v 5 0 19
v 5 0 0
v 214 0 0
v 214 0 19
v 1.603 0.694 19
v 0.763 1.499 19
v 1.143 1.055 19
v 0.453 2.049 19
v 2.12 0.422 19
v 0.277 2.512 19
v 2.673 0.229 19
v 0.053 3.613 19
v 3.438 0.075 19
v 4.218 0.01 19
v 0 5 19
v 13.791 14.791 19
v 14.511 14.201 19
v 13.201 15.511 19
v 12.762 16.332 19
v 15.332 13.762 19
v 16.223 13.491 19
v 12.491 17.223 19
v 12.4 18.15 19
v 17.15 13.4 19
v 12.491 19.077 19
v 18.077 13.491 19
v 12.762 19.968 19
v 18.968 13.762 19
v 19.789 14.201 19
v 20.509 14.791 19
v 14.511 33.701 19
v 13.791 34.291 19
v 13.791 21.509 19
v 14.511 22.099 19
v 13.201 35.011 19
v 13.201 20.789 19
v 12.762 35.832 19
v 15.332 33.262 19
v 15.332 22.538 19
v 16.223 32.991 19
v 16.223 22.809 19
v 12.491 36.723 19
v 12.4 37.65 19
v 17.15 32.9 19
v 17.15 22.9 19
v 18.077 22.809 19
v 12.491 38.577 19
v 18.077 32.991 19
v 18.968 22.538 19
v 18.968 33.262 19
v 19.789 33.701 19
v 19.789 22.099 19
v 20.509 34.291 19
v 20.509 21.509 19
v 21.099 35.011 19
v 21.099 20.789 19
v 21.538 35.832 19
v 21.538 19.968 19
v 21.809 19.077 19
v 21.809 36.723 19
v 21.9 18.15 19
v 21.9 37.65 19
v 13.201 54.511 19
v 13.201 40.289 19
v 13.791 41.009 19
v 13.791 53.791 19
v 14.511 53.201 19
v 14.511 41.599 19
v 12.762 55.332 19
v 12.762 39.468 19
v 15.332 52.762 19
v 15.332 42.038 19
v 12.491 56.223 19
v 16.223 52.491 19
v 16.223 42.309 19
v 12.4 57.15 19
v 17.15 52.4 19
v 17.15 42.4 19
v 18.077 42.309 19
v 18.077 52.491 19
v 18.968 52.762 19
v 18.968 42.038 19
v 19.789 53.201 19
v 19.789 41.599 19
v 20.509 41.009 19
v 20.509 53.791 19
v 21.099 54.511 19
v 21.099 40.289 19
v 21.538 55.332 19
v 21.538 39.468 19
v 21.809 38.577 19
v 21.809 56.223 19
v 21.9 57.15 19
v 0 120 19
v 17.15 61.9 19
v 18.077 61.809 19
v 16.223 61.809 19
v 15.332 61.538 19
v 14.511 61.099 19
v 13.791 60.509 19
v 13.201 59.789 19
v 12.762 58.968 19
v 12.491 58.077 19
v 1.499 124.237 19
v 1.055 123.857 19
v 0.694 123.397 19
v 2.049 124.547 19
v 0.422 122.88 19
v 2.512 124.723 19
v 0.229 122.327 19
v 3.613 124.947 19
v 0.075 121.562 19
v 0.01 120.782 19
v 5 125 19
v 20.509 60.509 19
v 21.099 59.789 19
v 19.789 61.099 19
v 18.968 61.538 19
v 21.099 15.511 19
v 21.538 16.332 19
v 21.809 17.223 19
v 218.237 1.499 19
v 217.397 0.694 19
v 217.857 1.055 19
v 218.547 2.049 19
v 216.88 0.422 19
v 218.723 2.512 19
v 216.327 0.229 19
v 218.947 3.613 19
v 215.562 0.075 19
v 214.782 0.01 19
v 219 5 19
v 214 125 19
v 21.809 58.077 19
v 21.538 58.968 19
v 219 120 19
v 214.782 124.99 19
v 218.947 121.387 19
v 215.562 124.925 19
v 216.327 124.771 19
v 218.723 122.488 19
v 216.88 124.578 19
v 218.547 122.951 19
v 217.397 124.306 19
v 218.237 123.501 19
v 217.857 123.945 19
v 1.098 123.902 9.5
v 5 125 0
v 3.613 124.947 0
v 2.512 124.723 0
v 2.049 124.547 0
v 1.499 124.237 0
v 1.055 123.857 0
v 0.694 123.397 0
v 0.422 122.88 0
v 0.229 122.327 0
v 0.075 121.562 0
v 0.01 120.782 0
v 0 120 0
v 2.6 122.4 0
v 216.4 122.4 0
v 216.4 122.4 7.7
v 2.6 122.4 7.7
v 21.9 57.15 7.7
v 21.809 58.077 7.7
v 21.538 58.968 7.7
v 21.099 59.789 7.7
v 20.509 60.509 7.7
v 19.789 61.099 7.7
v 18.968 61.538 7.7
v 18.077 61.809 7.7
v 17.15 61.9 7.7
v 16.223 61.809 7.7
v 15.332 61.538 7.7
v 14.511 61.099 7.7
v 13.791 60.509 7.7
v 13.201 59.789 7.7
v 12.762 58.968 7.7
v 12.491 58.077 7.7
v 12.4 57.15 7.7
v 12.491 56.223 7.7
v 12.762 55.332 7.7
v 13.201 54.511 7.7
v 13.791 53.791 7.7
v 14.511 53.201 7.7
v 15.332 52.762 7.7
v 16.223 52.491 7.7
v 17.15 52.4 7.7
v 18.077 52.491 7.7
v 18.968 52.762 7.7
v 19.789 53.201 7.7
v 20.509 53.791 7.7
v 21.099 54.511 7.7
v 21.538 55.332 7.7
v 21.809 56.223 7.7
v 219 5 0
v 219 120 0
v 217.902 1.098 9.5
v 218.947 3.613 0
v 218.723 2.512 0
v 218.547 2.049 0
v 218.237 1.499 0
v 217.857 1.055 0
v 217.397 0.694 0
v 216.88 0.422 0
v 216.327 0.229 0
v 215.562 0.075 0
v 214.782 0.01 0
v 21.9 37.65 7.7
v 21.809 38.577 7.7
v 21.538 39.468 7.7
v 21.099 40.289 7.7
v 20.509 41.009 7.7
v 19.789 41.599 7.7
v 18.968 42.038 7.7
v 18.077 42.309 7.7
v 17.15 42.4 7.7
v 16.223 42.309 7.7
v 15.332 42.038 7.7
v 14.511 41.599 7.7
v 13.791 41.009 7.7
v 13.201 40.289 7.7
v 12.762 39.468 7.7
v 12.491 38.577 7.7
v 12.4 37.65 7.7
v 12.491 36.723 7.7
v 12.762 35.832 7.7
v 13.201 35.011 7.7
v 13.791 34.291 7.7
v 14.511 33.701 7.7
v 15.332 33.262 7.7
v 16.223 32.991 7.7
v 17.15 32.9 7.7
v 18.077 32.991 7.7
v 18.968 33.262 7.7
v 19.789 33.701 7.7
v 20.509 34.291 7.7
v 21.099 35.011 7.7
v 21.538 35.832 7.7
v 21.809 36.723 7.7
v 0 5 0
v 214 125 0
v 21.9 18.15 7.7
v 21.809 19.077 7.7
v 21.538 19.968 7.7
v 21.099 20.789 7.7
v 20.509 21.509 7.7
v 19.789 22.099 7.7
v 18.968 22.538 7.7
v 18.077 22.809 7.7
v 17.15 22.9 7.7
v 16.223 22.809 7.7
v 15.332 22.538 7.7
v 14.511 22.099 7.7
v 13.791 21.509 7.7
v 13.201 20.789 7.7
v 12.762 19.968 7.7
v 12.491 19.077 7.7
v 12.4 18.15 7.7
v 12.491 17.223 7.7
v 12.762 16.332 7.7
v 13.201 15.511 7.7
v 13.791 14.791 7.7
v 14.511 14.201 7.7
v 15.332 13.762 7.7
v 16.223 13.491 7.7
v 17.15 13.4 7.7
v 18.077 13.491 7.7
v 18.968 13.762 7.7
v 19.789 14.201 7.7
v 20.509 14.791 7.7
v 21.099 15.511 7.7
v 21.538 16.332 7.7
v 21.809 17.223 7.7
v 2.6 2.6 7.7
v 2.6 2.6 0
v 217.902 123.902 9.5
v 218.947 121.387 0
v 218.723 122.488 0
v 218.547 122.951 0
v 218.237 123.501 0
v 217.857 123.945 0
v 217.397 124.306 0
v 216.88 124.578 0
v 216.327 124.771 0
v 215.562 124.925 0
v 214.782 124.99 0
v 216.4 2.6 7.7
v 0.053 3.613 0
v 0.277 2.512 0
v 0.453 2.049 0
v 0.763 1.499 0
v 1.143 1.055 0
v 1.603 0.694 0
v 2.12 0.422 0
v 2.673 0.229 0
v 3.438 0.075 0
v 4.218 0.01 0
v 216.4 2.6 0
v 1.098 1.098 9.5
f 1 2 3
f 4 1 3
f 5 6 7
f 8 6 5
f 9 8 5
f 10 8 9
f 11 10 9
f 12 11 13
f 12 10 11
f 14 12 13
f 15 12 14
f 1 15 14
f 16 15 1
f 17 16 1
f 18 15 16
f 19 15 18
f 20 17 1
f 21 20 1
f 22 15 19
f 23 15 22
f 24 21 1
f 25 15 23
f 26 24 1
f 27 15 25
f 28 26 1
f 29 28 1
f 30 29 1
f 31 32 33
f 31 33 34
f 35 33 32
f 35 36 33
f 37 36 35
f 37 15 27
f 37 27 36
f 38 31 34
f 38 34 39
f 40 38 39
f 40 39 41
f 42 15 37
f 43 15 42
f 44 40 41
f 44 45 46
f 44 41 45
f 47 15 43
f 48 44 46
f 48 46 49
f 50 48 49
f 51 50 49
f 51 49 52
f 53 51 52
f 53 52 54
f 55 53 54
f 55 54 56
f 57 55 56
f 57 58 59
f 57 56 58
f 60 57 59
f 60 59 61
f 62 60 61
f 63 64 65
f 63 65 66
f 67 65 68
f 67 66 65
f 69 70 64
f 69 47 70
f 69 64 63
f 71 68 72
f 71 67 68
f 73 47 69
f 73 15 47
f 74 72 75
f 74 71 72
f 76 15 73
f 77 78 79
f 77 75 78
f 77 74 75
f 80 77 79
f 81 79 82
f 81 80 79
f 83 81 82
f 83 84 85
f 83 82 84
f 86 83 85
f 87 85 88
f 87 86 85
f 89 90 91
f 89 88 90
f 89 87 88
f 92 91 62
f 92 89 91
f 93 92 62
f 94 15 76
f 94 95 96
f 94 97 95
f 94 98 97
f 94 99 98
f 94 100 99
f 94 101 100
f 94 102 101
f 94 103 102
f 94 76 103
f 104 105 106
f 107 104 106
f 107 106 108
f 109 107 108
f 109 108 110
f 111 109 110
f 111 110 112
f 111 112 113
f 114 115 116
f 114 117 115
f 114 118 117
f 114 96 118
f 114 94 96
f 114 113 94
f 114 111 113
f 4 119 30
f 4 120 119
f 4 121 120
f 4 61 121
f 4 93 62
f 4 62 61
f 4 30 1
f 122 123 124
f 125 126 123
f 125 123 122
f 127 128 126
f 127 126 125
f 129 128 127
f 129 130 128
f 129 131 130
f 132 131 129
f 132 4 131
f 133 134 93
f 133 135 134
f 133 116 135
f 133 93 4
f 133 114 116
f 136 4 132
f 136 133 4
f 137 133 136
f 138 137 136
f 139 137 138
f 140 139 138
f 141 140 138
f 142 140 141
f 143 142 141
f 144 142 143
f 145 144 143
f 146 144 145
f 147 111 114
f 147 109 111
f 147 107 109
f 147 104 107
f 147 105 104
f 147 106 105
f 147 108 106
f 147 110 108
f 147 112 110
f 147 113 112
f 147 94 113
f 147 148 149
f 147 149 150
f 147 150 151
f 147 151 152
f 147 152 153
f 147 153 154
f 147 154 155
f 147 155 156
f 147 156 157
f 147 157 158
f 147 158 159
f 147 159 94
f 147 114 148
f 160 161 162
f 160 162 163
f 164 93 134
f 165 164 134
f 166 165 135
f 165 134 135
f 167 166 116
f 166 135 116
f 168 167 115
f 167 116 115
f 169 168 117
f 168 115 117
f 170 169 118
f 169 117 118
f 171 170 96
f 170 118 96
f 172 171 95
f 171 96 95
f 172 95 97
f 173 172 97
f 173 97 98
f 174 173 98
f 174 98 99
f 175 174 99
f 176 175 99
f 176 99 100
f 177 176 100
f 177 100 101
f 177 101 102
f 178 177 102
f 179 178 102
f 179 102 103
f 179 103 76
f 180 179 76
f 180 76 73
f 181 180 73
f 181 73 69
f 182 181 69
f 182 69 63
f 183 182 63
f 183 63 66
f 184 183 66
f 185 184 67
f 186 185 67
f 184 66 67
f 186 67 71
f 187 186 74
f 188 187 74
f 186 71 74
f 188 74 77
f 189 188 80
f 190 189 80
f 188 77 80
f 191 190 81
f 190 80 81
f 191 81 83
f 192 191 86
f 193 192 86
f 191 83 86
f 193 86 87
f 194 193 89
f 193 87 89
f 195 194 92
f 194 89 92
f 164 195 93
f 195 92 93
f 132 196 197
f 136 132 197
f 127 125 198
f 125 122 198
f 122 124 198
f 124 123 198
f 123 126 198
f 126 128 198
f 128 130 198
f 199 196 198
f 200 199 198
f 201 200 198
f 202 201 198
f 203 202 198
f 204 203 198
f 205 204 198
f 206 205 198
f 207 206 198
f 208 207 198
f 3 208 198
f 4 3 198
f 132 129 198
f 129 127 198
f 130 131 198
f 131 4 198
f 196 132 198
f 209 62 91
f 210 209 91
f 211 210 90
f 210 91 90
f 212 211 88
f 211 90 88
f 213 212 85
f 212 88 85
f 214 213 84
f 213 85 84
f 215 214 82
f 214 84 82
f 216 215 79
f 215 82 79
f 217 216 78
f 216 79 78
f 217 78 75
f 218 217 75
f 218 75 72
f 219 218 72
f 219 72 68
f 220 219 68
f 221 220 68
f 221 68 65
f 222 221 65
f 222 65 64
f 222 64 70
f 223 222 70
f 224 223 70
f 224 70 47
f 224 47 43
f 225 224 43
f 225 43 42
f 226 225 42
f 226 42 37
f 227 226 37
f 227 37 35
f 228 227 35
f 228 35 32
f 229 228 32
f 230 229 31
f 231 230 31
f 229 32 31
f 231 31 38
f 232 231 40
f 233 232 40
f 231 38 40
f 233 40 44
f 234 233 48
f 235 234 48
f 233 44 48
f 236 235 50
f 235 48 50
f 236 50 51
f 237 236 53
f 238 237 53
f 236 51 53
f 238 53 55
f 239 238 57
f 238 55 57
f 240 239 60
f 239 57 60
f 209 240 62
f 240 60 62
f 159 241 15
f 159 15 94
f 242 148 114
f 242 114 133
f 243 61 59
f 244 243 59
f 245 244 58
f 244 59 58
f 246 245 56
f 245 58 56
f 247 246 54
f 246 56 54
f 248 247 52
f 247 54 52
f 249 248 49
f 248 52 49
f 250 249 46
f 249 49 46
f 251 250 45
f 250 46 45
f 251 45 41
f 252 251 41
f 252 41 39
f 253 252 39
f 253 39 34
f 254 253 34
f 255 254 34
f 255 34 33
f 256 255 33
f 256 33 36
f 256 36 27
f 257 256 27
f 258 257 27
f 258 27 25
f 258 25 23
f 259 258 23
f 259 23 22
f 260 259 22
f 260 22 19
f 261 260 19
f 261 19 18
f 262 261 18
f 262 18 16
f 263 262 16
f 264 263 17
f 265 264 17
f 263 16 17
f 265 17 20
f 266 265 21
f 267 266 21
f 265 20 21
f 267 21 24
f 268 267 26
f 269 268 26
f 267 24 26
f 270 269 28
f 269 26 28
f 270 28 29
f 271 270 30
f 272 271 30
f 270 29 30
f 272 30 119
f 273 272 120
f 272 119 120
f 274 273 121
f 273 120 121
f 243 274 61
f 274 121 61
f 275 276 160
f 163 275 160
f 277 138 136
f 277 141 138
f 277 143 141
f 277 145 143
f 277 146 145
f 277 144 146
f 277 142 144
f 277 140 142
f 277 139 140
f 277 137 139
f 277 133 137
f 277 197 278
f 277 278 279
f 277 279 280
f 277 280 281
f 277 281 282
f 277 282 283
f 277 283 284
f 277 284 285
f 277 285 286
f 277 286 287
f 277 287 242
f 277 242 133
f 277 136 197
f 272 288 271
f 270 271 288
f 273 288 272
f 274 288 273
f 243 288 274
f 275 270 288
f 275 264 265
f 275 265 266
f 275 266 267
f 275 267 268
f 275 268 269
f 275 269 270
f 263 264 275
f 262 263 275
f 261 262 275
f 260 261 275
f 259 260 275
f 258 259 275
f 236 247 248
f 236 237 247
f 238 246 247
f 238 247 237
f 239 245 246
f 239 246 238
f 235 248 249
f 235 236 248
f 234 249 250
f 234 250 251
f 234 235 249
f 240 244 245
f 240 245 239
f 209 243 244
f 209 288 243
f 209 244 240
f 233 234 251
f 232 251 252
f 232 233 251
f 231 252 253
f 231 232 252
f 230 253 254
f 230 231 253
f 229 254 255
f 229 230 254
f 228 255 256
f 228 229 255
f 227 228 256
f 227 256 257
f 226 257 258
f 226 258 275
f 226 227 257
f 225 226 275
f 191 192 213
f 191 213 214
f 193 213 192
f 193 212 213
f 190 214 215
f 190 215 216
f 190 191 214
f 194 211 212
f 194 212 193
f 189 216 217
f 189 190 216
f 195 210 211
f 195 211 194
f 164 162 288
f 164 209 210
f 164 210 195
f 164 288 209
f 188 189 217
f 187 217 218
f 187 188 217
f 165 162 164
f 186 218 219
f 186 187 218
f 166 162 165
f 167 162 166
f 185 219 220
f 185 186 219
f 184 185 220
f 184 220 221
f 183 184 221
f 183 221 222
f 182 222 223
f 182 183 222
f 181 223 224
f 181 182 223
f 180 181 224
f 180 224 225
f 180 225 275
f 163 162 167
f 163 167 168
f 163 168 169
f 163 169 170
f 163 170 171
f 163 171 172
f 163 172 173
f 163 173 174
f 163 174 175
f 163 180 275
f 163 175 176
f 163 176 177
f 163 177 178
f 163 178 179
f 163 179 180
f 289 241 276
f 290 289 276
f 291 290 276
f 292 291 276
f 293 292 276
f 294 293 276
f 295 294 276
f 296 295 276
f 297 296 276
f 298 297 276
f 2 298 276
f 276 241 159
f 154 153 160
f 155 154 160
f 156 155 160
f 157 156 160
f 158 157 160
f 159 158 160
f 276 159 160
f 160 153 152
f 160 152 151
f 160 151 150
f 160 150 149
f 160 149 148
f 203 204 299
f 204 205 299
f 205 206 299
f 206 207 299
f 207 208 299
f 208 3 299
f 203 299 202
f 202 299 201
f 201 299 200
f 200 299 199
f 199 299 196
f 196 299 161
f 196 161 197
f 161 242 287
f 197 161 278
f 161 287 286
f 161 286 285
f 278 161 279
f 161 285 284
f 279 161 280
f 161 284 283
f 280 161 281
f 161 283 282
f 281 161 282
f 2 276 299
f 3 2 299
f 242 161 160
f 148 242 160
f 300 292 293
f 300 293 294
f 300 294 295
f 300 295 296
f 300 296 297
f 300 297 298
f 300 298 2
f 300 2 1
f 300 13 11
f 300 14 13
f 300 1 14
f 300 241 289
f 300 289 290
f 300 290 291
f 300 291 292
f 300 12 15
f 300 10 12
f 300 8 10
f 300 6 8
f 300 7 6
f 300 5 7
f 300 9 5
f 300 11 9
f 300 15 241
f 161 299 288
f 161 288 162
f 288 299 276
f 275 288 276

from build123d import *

# Parameters (mm, degrees)
ESQUISSE1_W             = 219
ESQUISSE1_H             = 125
BOSS_EXTRU_1_DEPTH      = 19
ESQUISSE3_W             = 213.8
ESQUISSE3_H             = 119.8
ENL_V_MAT_EXTRU_1_DEPTH = 7.7
ESQUISSE4_R             = 4.75
ENL_V_MAT_EXTRU_2_DEPTH = 253.87744067
CONG_4_SIZE             = 5
CONG_5_SIZE             = 5


with BuildPart() as part:
    # Esquisse1 → Boss.-Extru.1 (new body)
    with BuildSketch(Plane.XY):
        with Locations((109.5, 62.5)):
            Rectangle(ESQUISSE1_W, ESQUISSE1_H)
    extrude(amount=BOSS_EXTRU_1_DEPTH)

    # Esquisse3 → Enlèv. mat.-Extru.1 (cut)
    with BuildSketch(Plane(origin=(0, 0, 0), x_dir=(-1, 0, 0), z_dir=(0, 0, -1))):
        with Locations((-109.5, 62.5)):
            Rectangle(ESQUISSE3_W, ESQUISSE3_H)
    extrude(amount=-ENL_V_MAT_EXTRU_1_DEPTH, mode=Mode.SUBTRACT)

    # Esquisse4 → Enlèv. mat.-Extru.2 (cut, through all)
    with BuildSketch(Plane.XY.offset(19)):
        with Locations((17.15, 57.15)):
            Circle(ESQUISSE4_R)
        with Locations((17.15, 37.65)):
            Circle(ESQUISSE4_R)
        with Locations((17.15, 18.15)):
            Circle(ESQUISSE4_R)
    extrude(amount=-ENL_V_MAT_EXTRU_2_DEPTH, mode=Mode.SUBTRACT)

    # Congé4
    # a fillet whose section is not a circle: 5 mm, written as the material it takes off along each edge
    with BuildSketch(Plane(origin=(219, 0, -12.5), x_dir=(-1, 0, 0), z_dir=(0, 0, 1))) as cong_4_piece_1:
        with BuildLine():
            add(Edge.make_bspline([(CONG_4_SIZE, 0), (CONG_4_SIZE * 0.831801948466, 0), (CONG_4_SIZE * 0.663603896932, 0), (CONG_4_SIZE * 0.292893218813, -CONG_4_SIZE * 0.0716919198361), (CONG_4_SIZE * 0.0716919198361, -CONG_4_SIZE * 0.292893218813), (0, -CONG_4_SIZE * 0.663603896932), (0, -CONG_4_SIZE * 0.831801948466), (0, -CONG_4_SIZE)], knots=[0, 0, 0, 0, 0, 0, 0.5, 0.5, 1, 1, 1, 1, 1, 1], degree=5))
            Line((0, -CONG_4_SIZE), (0, 0))
            Line((0, 0), (CONG_4_SIZE, 0))
        make_face()
    extrude(amount=44, mode=Mode.SUBTRACT)

    # Congé5
    # a fillet whose section is not a circle: 5 mm, written as the material it takes off along each edge
    with BuildSketch(Plane(origin=(0, 125, -12.5), x_dir=(0, -1, 0), z_dir=(0, 0, 1)), Plane(origin=(0, 0, -12.5), x_dir=(1, 0, 0), z_dir=(0, 0, 1)), Plane(origin=(219, 125, -12.5), x_dir=(-1, 0, 0), z_dir=(0, 0, 1))) as cong_5_piece_1:
        with BuildLine():
            add(Edge.make_bspline([(CONG_5_SIZE, 0), (CONG_5_SIZE * 0.831801948466, 0), (CONG_5_SIZE * 0.663603896932, 0), (CONG_5_SIZE * 0.292893218813, CONG_5_SIZE * 0.0716919198361), (CONG_5_SIZE * 0.0716919198361, CONG_5_SIZE * 0.292893218813), (0, CONG_5_SIZE * 0.663603896932), (0, CONG_5_SIZE * 0.831801948466), (0, CONG_5_SIZE)], knots=[0, 0, 0, 0, 0, 0, 0.5, 0.5, 1, 1, 1, 1, 1, 1], degree=5))
            Line((0, CONG_5_SIZE), (0, 0))
            Line((0, 0), (CONG_5_SIZE, 0))
        make_face()
    extrude(amount=44, mode=Mode.SUBTRACT)


solid = part.part
